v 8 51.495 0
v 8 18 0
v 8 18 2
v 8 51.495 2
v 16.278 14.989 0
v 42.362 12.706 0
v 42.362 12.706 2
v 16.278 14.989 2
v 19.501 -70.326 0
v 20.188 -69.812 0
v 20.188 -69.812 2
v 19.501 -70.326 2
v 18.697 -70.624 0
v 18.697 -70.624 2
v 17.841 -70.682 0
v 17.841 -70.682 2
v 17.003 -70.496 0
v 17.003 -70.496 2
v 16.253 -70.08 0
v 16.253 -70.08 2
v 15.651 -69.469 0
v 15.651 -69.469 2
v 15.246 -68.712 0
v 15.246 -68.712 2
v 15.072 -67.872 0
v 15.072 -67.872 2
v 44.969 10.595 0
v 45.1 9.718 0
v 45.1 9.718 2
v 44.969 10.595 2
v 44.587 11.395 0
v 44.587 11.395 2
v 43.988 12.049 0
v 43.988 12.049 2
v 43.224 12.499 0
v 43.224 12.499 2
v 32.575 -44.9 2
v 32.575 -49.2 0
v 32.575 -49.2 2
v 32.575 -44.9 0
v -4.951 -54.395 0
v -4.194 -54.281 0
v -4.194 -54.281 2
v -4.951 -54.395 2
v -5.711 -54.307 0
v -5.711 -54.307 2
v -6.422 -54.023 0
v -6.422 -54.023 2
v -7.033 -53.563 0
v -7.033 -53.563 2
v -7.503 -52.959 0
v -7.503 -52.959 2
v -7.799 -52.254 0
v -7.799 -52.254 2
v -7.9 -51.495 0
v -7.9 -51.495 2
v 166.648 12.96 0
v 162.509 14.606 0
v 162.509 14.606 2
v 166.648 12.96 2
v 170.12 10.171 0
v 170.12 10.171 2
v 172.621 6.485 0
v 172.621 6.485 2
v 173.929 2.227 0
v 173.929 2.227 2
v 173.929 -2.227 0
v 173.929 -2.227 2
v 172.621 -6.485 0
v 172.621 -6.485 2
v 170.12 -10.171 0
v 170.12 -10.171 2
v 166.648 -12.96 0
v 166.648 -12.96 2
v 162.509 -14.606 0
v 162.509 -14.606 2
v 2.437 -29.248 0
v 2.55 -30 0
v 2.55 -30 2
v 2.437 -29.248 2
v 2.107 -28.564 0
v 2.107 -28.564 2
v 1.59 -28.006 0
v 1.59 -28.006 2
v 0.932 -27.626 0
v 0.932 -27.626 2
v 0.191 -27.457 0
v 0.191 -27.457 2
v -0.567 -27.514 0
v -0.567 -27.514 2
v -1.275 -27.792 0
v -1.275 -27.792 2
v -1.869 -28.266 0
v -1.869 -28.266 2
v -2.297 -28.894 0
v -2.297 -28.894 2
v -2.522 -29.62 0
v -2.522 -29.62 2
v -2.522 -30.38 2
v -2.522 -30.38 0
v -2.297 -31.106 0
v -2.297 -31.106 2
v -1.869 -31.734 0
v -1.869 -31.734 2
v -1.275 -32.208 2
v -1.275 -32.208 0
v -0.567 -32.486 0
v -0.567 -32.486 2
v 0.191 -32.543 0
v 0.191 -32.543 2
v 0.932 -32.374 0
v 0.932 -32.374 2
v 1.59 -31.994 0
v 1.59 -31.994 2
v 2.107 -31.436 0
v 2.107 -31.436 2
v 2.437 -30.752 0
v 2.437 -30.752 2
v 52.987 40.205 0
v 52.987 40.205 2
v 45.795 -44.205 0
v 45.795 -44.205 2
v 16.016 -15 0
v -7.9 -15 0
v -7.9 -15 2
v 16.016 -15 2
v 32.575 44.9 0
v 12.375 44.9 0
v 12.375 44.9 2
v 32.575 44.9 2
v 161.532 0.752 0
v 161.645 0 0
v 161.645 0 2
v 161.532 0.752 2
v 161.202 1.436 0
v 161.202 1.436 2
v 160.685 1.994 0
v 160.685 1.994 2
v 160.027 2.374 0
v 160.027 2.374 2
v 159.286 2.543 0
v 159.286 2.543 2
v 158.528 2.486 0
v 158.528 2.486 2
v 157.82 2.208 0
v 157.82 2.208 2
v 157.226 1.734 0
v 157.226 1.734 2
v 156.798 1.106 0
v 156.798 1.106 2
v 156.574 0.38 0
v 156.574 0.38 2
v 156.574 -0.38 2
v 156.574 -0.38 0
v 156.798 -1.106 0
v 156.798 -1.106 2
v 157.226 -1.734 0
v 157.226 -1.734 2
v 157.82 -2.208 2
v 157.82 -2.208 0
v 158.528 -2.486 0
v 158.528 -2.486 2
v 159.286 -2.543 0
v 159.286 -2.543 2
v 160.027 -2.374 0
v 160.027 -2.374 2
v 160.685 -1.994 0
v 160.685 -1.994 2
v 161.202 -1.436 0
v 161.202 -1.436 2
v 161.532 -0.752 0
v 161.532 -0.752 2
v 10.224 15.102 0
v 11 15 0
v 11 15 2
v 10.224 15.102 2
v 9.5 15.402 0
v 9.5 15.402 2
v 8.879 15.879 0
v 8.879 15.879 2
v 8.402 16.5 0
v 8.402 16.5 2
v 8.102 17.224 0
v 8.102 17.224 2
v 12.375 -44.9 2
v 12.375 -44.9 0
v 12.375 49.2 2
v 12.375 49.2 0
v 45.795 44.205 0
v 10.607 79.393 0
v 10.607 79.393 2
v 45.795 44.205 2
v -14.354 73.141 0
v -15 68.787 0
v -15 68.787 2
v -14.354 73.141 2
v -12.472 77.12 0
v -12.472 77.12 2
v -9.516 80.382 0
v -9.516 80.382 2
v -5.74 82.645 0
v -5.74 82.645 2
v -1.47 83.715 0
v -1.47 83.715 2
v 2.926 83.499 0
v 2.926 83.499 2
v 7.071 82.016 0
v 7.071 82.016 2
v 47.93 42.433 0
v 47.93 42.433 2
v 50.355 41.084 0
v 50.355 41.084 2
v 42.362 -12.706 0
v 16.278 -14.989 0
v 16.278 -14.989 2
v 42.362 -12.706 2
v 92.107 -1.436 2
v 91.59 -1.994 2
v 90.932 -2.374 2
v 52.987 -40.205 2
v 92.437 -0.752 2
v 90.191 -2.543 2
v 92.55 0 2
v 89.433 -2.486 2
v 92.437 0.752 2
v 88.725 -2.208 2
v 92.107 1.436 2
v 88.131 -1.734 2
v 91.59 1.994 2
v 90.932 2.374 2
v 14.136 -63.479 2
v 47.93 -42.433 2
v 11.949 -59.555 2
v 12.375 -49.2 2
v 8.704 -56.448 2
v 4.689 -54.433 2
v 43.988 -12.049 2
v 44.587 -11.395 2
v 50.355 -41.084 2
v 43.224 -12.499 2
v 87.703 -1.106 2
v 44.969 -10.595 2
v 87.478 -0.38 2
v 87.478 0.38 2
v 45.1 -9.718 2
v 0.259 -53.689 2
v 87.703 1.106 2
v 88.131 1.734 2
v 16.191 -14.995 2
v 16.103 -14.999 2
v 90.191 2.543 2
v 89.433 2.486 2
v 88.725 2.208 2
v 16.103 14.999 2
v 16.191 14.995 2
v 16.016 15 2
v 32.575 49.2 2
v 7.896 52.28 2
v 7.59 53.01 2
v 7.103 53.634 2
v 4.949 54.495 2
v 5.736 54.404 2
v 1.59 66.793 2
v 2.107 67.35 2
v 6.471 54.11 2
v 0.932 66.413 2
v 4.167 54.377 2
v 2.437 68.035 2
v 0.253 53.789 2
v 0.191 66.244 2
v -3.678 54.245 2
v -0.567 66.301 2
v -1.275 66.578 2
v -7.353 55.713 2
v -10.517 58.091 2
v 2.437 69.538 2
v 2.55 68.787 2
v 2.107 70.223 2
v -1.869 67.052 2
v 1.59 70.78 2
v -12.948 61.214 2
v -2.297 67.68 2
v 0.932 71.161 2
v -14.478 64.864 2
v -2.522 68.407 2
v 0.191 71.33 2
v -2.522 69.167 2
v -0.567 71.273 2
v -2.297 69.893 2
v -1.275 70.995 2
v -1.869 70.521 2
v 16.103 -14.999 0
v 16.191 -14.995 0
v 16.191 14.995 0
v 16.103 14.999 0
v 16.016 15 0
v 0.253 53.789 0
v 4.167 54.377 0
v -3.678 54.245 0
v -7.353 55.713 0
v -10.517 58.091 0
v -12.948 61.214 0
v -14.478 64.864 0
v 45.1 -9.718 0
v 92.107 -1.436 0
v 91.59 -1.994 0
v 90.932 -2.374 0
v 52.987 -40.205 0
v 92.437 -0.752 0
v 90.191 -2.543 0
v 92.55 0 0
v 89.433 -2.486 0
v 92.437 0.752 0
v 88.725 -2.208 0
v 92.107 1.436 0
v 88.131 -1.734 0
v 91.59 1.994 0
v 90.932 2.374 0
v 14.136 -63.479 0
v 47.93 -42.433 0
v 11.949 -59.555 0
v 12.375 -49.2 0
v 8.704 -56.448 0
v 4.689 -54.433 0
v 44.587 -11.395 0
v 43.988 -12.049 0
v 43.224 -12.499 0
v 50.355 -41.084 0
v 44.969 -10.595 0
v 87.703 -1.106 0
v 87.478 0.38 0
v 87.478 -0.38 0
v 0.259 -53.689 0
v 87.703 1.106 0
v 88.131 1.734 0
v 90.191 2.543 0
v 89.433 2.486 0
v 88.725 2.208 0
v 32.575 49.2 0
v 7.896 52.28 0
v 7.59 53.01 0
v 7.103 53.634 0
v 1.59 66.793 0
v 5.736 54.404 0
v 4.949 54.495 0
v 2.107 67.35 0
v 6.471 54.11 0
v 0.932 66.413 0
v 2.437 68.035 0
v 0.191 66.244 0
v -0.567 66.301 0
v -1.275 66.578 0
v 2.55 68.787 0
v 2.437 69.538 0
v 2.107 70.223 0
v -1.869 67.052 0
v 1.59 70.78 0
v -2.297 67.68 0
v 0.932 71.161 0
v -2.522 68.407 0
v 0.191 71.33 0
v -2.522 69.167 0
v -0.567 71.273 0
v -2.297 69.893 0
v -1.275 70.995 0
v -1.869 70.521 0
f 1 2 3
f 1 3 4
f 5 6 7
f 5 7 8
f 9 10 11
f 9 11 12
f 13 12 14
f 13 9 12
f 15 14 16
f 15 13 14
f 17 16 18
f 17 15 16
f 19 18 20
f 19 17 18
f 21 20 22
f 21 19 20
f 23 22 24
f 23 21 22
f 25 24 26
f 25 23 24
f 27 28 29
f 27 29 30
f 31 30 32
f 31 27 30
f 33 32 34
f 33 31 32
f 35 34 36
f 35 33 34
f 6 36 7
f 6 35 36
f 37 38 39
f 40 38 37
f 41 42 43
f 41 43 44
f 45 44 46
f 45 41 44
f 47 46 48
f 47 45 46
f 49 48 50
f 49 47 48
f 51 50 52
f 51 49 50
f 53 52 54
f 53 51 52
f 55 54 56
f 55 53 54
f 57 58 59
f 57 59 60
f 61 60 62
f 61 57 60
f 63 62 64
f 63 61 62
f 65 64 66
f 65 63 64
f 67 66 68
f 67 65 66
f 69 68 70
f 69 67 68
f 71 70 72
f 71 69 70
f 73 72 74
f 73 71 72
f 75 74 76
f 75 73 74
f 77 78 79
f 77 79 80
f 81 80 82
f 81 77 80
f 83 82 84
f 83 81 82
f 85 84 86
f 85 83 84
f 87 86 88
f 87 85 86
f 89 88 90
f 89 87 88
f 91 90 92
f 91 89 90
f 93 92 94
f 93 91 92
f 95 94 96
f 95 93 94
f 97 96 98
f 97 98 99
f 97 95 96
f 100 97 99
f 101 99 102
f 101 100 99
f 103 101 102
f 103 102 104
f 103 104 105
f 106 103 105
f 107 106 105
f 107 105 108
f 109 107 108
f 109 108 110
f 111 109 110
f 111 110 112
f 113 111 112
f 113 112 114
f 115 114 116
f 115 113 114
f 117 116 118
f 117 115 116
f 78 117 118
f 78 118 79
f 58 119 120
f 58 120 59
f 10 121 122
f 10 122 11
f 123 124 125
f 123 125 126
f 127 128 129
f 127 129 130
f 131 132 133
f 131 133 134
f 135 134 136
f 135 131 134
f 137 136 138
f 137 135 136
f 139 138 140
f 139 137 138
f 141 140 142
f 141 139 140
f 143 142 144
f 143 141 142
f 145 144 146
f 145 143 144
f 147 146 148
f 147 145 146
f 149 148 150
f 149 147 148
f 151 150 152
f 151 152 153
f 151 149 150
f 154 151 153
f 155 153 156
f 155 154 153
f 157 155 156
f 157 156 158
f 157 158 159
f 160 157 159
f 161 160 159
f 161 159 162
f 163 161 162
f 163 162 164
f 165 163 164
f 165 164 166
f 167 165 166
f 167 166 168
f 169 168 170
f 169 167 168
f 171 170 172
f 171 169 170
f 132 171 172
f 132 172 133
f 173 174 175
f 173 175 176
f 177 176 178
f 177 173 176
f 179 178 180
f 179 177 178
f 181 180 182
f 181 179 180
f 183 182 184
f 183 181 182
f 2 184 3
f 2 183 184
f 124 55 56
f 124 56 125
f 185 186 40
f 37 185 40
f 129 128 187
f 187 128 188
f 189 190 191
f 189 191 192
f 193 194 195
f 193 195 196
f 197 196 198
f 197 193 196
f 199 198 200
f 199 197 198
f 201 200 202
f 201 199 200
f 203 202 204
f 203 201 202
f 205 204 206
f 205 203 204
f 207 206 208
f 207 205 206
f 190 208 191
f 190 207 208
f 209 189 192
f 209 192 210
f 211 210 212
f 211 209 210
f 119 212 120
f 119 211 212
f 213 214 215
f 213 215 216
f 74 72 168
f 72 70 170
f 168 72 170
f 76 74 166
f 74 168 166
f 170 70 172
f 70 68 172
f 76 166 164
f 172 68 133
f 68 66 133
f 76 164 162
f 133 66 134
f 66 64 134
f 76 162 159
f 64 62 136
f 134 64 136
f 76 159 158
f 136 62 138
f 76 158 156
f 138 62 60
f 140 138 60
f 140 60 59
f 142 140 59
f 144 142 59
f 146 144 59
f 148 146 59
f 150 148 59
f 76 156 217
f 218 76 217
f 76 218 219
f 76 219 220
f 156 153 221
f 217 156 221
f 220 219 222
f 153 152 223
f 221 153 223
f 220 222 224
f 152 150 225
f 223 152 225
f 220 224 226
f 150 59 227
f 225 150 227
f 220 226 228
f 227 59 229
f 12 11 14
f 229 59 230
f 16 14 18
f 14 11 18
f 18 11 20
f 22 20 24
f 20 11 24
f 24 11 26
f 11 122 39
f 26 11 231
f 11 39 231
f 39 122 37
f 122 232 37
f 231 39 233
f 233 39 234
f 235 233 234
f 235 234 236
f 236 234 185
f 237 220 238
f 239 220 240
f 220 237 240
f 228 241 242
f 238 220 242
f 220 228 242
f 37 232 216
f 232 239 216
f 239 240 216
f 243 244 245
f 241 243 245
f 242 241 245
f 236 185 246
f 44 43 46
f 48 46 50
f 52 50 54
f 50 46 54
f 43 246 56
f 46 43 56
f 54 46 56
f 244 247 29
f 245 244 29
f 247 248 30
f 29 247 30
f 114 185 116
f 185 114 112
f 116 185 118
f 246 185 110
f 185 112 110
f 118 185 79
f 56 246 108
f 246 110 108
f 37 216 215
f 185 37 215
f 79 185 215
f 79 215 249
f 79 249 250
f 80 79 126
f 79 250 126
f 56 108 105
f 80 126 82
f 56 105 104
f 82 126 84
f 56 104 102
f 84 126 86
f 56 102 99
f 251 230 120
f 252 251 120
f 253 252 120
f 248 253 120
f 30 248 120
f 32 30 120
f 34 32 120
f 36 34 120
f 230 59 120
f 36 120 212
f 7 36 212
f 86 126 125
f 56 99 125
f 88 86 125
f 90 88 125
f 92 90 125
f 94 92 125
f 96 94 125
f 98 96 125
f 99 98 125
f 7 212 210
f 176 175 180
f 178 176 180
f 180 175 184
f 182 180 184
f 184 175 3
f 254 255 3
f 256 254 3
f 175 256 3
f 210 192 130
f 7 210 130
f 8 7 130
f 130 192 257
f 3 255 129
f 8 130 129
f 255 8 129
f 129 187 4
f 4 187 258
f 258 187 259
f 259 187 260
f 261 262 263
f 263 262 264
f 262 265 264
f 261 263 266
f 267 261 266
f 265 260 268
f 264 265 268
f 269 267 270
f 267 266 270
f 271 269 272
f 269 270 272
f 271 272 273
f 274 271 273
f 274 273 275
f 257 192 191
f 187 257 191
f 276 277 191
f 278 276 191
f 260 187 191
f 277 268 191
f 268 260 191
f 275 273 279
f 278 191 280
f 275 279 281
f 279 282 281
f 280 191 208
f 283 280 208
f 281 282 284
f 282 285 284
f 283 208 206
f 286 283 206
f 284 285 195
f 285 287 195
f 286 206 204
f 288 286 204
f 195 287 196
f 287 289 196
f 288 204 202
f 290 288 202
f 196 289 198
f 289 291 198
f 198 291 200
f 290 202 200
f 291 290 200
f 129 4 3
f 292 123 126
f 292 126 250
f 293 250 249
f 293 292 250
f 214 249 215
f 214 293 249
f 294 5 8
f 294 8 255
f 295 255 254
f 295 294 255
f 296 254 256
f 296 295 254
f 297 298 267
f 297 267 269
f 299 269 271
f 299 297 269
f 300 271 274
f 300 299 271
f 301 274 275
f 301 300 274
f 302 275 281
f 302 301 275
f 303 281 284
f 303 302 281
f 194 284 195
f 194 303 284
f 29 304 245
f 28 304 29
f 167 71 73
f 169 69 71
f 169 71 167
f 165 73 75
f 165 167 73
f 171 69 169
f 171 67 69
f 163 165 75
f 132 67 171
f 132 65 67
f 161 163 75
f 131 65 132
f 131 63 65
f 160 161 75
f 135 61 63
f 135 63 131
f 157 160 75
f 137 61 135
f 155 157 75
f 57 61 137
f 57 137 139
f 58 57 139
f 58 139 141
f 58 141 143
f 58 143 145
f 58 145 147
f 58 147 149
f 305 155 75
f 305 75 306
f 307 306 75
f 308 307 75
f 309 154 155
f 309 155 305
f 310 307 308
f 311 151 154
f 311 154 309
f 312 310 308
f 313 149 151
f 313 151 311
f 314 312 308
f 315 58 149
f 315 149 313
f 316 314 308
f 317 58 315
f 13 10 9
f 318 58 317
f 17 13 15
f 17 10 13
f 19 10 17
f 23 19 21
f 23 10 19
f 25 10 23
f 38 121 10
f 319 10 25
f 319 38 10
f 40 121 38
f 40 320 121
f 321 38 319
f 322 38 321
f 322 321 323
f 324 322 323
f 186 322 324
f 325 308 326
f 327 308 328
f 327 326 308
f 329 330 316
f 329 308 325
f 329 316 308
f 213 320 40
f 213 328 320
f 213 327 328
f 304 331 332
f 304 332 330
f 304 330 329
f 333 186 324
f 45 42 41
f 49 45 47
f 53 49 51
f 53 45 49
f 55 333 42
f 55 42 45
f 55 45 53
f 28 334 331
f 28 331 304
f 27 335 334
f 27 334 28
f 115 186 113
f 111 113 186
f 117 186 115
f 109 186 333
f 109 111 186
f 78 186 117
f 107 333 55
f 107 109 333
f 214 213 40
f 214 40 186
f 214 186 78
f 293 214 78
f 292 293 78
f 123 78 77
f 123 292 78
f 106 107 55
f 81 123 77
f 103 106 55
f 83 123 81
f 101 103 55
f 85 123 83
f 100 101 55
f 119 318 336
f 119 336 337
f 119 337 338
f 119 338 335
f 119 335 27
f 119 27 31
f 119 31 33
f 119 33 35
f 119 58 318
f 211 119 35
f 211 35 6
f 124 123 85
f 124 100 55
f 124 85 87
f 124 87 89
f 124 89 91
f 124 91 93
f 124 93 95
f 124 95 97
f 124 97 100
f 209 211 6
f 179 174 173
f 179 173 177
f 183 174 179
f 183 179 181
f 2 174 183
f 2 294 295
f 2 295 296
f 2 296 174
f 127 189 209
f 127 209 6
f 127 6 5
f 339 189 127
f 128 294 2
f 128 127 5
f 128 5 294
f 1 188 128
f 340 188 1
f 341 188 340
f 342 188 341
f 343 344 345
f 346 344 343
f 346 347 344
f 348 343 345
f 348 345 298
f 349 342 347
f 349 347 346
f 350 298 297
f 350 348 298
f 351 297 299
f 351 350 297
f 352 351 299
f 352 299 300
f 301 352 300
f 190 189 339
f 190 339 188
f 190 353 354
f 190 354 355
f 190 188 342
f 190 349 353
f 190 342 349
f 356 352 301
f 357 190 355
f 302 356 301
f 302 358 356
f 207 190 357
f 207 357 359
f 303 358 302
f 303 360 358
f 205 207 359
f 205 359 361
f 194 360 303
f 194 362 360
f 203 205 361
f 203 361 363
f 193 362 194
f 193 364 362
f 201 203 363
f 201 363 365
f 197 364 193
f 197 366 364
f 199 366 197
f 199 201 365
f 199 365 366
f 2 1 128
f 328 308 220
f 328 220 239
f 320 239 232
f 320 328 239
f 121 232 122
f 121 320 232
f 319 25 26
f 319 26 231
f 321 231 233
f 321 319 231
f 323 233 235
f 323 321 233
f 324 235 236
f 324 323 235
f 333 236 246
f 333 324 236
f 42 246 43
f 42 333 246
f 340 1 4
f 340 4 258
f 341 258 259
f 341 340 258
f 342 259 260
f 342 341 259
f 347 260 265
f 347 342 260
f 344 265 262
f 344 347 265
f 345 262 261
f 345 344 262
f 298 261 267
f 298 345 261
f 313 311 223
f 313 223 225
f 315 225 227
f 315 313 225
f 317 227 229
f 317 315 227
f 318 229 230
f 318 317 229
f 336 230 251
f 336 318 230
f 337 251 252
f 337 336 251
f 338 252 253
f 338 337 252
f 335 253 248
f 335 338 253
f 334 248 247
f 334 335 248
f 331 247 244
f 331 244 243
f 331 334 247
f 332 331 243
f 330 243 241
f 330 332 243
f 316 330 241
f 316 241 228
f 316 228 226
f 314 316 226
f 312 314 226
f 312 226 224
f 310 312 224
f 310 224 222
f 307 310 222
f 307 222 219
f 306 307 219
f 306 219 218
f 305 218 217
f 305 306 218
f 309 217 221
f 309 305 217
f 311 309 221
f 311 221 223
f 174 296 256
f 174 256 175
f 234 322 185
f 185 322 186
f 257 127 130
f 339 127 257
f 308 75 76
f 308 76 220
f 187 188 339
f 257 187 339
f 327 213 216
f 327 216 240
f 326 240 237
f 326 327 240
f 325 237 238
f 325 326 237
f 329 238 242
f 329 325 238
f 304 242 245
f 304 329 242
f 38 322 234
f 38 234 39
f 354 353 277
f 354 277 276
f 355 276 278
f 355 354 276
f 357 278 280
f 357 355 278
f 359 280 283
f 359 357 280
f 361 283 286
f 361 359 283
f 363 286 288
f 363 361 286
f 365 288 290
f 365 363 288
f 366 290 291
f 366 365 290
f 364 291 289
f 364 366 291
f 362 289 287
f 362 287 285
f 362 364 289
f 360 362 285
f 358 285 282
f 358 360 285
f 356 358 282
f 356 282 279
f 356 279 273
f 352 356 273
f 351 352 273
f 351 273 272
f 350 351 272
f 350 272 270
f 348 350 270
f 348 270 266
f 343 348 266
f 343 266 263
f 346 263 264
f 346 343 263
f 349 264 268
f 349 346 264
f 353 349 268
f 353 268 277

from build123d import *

# Parameters (mm, degrees)
SKETCH1_R           = 2.55
SKETCH1_W           = 20.2
SKETCH1_H           = 4.3
BOSS_EXTRUDE1_DEPTH = 2


with BuildPart() as part:
    # Sketch1 → Boss-Extrude1 (new body)
    with BuildSketch(Plane.XY):
        with BuildLine():
            Line((10.606601718, 79.393398282), (45.794858405, 44.205141595))
            ThreePointArc((45.794858405, 44.205141595), (49.111477563, 41.702351478), (52.987446424, 40.205425828))
            Line((52.987446424, 40.205425828), (162.509181482, 14.606317485))
            ThreePointArc((162.509181482, 14.606317485), (174.095167783, 0), (162.509181482, -14.606317485))
            Line((162.509181482, -14.606317485), (52.987446424, -40.205425828))
            ThreePointArc((52.987446424, -40.205425828), (49.111477563, -41.702351478), (45.794858405, -44.205141595))
            Line((45.794858405, -44.205141595), (45, -45))
            Line((45, -45), (20.188094295, -69.811905705))
            ThreePointArc((20.188094295, -69.811905705), (17.003220161, -70.495733011), (15.072281031, -67.872277826))
            ThreePointArc((15.072281031, -67.872277826), (8.704147834, -56.447922609), (-4.194444444, -54.28105164))
            ThreePointArc((-4.194444444, -54.28105164), (-6.742683116, -53.813165335), (-7.9, -51.495180099))
            Line((-7.9, -51.495180099), (-7.9, -15))
            Line((-7.9, -15), (16.016224064, -15))
            ThreePointArc((16.016224064, -15), (16.147099086, -14.997143929), (16.277724915, -14.988581152))
            Line((16.277724915, -14.988581152), (42.361500851, -12.706250758))
            ThreePointArc((42.361500851, -12.706250758), (44.311843411, -11.744427787), (45.1, -9.717669606))
            Line((45.1, -9.717669606), (45.1, 9.717669606))
            ThreePointArc((45.1, 9.717669606), (44.311843411, 11.744427787), (42.361500851, 12.706250758))
            Line((42.361500851, 12.706250758), (16.277724915, 14.988581152))
            ThreePointArc((16.277724915, 14.988581152), (16.147099086, 14.997143929), (16.016224064, 15))
            Line((16.016224064, 15), (11, 15))
            ThreePointArc((11, 15), (8.878679656, 15.878679656), (8, 18))
            Line((8, 18), (8, 51.495180099))
            ThreePointArc((8, 51.495180099), (6.802775638, 53.89309586), (4.166666667, 54.377116176))
            ThreePointArc((4.166666667, 54.377116176), (-9.013878189, 56.797217756), (-15, 68.786796564))
            ThreePointArc((-15, 68.786796564), (-5.740251485, 82.644989552), (10.606601718, 79.393398282))
        make_face()
        with Locations((159.095167783, 0)):
            Circle(SKETCH1_R, mode=Mode.SUBTRACT)
        with Locations((90, 0)):
            Circle(SKETCH1_R, mode=Mode.SUBTRACT)
        with Locations((0, 68.786796564)):
            Circle(SKETCH1_R, mode=Mode.SUBTRACT)
        with Locations((0, -30)):
            Circle(SKETCH1_R, mode=Mode.SUBTRACT)
        with Locations((22.474619372, 47.05)):
            Rectangle(SKETCH1_W, SKETCH1_H, mode=Mode.SUBTRACT)
        with Locations((22.474619372, -47.05)):
            Rectangle(SKETCH1_W, SKETCH1_H, mode=Mode.SUBTRACT)
    extrude(amount=BOSS_EXTRUDE1_DEPTH)


solid = part.part
